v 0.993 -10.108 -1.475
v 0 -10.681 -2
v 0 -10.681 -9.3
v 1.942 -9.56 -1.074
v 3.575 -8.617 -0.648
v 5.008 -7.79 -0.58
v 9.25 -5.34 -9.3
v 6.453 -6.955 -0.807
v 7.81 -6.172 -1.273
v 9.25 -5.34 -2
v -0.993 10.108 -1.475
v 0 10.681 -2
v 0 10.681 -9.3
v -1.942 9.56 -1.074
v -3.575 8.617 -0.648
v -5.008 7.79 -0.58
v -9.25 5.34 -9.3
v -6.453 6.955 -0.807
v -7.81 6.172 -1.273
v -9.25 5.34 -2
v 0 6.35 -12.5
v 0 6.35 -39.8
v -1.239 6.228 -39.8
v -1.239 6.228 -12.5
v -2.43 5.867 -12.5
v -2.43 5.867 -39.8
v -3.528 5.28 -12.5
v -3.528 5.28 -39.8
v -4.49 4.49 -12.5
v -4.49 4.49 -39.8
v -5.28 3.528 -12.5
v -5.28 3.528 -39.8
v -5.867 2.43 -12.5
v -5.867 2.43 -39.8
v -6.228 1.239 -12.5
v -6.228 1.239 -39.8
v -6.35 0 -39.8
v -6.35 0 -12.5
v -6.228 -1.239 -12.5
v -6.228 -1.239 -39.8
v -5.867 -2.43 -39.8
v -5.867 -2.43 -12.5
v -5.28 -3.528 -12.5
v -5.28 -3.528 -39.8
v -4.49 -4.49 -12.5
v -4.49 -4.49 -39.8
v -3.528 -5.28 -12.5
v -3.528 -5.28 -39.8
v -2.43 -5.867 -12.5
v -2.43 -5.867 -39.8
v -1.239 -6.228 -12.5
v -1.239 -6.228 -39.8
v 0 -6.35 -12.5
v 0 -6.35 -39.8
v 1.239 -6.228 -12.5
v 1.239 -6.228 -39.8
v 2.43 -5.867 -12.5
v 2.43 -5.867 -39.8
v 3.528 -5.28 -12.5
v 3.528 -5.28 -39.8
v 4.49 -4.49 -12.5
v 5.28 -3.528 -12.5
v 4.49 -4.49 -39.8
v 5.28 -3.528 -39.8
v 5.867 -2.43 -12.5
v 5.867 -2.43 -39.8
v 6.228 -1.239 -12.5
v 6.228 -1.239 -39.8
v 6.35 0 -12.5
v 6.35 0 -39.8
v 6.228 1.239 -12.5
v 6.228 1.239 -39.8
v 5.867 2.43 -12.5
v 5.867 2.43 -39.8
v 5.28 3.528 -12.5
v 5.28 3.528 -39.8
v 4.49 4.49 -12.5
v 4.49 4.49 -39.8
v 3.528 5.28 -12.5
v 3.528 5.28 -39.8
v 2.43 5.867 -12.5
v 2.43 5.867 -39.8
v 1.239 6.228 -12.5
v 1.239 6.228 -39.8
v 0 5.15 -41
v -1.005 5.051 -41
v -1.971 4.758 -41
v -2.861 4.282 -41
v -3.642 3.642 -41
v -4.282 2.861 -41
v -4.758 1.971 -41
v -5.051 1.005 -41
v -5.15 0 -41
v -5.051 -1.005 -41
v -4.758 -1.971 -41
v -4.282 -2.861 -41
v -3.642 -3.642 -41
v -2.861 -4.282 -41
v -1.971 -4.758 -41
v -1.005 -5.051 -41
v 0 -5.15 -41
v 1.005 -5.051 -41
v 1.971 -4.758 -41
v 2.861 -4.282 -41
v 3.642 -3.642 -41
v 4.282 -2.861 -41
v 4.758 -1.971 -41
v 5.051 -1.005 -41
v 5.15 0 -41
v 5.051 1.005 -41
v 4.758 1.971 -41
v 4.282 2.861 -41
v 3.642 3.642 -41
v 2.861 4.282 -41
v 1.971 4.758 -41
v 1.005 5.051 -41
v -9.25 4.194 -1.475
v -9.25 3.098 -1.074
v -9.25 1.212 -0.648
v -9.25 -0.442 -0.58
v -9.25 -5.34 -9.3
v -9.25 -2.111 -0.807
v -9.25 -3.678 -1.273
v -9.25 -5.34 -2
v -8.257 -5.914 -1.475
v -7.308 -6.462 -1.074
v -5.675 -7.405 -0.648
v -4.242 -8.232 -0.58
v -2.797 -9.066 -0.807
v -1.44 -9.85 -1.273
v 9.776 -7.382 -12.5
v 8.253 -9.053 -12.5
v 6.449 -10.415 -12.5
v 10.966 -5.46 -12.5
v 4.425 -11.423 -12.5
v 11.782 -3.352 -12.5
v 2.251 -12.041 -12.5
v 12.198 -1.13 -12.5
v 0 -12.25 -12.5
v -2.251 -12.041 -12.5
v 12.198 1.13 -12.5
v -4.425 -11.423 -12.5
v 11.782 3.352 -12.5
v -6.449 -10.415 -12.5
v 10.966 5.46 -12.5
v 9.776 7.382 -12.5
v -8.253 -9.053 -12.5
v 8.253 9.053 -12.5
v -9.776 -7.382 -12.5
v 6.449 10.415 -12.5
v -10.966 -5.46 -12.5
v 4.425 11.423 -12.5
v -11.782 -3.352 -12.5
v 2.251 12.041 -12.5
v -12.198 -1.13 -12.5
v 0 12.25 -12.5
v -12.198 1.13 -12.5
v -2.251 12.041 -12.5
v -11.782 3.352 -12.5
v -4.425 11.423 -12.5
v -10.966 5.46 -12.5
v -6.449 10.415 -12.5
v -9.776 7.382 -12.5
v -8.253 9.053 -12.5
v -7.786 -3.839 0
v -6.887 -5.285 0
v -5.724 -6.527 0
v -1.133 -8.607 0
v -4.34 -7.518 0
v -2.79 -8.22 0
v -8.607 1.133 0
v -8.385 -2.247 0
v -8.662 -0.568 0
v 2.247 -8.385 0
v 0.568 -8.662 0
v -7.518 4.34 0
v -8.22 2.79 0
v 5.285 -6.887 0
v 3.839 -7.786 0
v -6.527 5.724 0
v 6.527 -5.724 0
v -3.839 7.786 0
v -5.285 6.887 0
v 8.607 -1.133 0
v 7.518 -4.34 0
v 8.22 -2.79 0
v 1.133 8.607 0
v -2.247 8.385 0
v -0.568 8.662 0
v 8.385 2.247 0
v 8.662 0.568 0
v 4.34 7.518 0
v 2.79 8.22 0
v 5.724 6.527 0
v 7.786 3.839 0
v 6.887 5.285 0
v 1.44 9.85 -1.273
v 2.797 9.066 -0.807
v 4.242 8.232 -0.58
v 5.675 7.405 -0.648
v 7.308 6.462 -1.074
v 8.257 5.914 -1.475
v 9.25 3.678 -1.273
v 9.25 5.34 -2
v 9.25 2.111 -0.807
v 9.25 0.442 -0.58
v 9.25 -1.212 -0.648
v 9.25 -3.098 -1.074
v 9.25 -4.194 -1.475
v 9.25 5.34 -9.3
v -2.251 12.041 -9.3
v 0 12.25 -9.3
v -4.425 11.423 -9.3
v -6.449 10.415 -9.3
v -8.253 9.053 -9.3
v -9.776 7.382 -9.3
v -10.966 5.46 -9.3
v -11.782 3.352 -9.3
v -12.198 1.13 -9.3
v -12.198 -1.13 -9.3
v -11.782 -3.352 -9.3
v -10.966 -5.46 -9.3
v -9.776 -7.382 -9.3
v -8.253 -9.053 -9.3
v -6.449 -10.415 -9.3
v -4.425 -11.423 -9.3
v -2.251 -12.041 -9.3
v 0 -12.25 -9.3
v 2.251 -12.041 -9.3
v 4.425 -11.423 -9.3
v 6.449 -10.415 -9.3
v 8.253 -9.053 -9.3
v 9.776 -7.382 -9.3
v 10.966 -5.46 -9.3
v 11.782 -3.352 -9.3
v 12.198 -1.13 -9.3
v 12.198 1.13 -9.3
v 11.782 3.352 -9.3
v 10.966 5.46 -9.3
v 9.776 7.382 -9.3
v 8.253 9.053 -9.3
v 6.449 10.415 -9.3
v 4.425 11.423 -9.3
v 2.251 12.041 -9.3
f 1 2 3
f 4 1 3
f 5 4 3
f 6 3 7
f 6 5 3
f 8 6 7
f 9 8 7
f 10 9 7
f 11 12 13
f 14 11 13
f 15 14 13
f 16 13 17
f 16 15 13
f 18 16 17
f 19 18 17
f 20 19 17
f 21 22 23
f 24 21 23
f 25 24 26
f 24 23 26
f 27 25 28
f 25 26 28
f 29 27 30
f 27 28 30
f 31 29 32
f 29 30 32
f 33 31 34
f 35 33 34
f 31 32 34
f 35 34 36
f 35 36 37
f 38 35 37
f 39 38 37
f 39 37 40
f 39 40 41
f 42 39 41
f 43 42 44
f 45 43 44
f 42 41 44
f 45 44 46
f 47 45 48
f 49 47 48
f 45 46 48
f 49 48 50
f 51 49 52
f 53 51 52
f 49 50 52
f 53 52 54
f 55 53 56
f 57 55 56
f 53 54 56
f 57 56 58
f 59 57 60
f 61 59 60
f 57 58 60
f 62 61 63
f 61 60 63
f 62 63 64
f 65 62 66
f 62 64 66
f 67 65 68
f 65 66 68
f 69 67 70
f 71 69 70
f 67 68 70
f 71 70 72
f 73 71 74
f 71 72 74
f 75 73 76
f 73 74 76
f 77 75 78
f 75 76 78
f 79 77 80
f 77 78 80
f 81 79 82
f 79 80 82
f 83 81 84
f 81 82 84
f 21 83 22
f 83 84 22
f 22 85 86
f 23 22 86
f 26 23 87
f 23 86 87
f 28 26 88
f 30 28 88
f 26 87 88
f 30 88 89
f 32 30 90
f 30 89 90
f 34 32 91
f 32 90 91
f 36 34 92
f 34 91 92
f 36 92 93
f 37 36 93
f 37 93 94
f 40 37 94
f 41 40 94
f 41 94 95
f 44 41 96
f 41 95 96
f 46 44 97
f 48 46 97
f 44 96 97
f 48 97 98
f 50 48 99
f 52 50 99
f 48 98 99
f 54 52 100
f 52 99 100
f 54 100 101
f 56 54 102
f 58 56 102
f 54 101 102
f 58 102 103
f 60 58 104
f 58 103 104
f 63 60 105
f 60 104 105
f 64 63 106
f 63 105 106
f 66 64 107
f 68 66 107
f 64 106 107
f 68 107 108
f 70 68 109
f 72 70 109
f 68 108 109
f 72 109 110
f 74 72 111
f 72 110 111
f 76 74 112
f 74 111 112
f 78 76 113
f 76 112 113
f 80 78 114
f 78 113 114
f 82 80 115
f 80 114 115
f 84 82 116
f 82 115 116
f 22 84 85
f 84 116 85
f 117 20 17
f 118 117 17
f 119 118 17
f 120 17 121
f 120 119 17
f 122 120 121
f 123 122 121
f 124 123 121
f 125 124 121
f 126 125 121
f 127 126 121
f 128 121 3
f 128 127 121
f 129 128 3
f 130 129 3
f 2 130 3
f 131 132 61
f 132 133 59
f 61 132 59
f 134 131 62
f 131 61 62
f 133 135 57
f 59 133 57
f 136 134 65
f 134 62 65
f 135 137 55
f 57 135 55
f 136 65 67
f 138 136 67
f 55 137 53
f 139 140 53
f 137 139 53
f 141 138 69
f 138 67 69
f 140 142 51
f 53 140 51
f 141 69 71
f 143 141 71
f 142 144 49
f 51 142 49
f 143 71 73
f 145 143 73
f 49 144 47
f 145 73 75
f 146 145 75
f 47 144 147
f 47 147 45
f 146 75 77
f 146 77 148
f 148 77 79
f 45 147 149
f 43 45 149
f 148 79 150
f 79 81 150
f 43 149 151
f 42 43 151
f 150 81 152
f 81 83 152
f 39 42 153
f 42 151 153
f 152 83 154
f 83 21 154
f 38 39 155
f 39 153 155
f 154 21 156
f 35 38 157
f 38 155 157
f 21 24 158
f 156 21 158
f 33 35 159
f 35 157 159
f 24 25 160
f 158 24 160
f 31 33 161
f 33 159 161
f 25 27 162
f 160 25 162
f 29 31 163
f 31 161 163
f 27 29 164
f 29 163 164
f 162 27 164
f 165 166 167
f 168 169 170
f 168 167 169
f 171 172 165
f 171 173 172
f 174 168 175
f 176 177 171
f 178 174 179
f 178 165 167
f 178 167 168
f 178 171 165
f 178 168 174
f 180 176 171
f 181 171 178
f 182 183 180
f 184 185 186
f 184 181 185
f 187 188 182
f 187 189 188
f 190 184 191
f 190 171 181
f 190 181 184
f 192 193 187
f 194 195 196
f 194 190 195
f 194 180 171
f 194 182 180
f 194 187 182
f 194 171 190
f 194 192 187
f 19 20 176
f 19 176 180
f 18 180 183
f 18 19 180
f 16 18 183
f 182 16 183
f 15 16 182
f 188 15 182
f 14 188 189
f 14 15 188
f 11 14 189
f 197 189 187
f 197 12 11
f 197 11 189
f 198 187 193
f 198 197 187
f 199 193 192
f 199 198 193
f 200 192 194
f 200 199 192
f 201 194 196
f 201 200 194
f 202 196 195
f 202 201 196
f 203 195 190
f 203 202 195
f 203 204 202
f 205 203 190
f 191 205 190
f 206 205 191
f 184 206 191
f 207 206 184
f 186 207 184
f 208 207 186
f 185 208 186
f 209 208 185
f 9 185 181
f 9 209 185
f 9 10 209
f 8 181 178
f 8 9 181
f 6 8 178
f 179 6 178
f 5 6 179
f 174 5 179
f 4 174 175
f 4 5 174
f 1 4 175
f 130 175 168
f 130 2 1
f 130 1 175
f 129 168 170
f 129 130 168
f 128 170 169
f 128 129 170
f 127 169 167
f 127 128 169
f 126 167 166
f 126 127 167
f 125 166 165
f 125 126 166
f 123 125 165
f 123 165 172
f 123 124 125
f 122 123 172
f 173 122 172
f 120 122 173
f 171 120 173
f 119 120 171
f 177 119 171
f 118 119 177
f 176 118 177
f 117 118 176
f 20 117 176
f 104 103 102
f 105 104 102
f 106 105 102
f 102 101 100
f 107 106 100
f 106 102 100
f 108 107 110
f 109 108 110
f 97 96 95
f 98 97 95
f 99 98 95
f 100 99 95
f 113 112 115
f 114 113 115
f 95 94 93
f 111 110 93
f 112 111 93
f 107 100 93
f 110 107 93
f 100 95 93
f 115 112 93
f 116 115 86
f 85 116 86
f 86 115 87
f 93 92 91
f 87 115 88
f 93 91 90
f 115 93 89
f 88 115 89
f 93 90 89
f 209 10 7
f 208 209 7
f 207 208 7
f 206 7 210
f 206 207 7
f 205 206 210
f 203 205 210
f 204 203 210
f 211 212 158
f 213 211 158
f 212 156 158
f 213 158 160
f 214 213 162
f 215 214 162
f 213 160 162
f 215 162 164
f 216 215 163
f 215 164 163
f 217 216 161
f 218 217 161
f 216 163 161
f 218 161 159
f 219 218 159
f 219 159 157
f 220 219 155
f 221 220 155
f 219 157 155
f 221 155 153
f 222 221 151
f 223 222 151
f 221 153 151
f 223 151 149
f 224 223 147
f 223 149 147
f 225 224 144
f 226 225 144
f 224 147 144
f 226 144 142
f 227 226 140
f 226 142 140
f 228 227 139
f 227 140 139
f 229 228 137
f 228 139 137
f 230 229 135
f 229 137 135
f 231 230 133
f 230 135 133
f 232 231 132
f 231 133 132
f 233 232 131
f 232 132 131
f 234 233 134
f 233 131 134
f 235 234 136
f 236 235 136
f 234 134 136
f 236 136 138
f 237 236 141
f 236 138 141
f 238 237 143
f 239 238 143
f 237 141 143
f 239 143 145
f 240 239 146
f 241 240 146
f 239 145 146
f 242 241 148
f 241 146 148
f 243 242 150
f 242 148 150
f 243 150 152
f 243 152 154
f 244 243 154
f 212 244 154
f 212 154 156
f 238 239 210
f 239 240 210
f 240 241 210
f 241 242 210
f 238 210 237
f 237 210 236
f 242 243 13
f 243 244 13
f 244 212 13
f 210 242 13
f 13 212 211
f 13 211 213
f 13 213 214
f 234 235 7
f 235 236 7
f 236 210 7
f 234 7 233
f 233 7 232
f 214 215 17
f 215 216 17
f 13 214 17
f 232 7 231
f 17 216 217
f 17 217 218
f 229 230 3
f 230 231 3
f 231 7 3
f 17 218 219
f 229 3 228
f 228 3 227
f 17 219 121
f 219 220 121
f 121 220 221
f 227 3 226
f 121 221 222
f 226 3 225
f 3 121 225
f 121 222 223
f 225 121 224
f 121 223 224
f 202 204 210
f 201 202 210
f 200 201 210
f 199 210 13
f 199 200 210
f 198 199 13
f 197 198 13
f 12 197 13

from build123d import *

# Parameters (mm, degrees)
BOSS_EXTRUDE1_DEPTH = 9.3
CHAMFER1_SIZE       = 1.2


with BuildPart() as part:
    # Sketch1 → Boss-Extrude1 (new body)
    with BuildSketch(Plane.XY):
        Polygon((9.25, -5.34048999), (9.25, 5.34048999), (0, 10.68097998), (-9.25, 5.34048999), (-9.25, -5.34048999), (0, -10.68097998), align=None)
    extrude(amount=-BOSS_EXTRUDE1_DEPTH)

    # Sketch2 → Revolve1 (revolve)
    with BuildSketch(Plane(origin=(0, 0, 0), x_dir=(0, 0, -1), z_dir=(1, 0, 0))):
        Polygon((9.3, 12.25), (12.5, 12.25), (12.5, 6.35), (41, 6.35), (41, 0), (9.3, 0), align=None)
    revolve(axis=Axis((0, 0, -41), (0, 0, 1)))

    # Sketch3 → Cut-Revolve1 (revolve, cut)
    with BuildSketch(Plane(origin=(0, 0, 0), x_dir=(0, 0, -1), z_dir=(1, 0, 0)), mode=Mode.PRIVATE) as cut_revolve1_sk:
        Polygon((0, 8.68097998), (2, 10.68097998), (0, 10.68097998), align=None)
    revolve(cut_revolve1_sk.sketch.rotate(Axis((0, 0, 0), (0, 0, -1)), 300.000000037), axis=Axis((0, 0, 0), (0, 0, -1)), mode=Mode.SUBTRACT)

    # Chamfer1
    chamfer1_edges = [part.edges().sort_by_distance(p)[0] for p in [
        (0, -6.35, -41),
    ]]
    chamfer(chamfer1_edges, length=CHAMFER1_SIZE)


solid = part.part
